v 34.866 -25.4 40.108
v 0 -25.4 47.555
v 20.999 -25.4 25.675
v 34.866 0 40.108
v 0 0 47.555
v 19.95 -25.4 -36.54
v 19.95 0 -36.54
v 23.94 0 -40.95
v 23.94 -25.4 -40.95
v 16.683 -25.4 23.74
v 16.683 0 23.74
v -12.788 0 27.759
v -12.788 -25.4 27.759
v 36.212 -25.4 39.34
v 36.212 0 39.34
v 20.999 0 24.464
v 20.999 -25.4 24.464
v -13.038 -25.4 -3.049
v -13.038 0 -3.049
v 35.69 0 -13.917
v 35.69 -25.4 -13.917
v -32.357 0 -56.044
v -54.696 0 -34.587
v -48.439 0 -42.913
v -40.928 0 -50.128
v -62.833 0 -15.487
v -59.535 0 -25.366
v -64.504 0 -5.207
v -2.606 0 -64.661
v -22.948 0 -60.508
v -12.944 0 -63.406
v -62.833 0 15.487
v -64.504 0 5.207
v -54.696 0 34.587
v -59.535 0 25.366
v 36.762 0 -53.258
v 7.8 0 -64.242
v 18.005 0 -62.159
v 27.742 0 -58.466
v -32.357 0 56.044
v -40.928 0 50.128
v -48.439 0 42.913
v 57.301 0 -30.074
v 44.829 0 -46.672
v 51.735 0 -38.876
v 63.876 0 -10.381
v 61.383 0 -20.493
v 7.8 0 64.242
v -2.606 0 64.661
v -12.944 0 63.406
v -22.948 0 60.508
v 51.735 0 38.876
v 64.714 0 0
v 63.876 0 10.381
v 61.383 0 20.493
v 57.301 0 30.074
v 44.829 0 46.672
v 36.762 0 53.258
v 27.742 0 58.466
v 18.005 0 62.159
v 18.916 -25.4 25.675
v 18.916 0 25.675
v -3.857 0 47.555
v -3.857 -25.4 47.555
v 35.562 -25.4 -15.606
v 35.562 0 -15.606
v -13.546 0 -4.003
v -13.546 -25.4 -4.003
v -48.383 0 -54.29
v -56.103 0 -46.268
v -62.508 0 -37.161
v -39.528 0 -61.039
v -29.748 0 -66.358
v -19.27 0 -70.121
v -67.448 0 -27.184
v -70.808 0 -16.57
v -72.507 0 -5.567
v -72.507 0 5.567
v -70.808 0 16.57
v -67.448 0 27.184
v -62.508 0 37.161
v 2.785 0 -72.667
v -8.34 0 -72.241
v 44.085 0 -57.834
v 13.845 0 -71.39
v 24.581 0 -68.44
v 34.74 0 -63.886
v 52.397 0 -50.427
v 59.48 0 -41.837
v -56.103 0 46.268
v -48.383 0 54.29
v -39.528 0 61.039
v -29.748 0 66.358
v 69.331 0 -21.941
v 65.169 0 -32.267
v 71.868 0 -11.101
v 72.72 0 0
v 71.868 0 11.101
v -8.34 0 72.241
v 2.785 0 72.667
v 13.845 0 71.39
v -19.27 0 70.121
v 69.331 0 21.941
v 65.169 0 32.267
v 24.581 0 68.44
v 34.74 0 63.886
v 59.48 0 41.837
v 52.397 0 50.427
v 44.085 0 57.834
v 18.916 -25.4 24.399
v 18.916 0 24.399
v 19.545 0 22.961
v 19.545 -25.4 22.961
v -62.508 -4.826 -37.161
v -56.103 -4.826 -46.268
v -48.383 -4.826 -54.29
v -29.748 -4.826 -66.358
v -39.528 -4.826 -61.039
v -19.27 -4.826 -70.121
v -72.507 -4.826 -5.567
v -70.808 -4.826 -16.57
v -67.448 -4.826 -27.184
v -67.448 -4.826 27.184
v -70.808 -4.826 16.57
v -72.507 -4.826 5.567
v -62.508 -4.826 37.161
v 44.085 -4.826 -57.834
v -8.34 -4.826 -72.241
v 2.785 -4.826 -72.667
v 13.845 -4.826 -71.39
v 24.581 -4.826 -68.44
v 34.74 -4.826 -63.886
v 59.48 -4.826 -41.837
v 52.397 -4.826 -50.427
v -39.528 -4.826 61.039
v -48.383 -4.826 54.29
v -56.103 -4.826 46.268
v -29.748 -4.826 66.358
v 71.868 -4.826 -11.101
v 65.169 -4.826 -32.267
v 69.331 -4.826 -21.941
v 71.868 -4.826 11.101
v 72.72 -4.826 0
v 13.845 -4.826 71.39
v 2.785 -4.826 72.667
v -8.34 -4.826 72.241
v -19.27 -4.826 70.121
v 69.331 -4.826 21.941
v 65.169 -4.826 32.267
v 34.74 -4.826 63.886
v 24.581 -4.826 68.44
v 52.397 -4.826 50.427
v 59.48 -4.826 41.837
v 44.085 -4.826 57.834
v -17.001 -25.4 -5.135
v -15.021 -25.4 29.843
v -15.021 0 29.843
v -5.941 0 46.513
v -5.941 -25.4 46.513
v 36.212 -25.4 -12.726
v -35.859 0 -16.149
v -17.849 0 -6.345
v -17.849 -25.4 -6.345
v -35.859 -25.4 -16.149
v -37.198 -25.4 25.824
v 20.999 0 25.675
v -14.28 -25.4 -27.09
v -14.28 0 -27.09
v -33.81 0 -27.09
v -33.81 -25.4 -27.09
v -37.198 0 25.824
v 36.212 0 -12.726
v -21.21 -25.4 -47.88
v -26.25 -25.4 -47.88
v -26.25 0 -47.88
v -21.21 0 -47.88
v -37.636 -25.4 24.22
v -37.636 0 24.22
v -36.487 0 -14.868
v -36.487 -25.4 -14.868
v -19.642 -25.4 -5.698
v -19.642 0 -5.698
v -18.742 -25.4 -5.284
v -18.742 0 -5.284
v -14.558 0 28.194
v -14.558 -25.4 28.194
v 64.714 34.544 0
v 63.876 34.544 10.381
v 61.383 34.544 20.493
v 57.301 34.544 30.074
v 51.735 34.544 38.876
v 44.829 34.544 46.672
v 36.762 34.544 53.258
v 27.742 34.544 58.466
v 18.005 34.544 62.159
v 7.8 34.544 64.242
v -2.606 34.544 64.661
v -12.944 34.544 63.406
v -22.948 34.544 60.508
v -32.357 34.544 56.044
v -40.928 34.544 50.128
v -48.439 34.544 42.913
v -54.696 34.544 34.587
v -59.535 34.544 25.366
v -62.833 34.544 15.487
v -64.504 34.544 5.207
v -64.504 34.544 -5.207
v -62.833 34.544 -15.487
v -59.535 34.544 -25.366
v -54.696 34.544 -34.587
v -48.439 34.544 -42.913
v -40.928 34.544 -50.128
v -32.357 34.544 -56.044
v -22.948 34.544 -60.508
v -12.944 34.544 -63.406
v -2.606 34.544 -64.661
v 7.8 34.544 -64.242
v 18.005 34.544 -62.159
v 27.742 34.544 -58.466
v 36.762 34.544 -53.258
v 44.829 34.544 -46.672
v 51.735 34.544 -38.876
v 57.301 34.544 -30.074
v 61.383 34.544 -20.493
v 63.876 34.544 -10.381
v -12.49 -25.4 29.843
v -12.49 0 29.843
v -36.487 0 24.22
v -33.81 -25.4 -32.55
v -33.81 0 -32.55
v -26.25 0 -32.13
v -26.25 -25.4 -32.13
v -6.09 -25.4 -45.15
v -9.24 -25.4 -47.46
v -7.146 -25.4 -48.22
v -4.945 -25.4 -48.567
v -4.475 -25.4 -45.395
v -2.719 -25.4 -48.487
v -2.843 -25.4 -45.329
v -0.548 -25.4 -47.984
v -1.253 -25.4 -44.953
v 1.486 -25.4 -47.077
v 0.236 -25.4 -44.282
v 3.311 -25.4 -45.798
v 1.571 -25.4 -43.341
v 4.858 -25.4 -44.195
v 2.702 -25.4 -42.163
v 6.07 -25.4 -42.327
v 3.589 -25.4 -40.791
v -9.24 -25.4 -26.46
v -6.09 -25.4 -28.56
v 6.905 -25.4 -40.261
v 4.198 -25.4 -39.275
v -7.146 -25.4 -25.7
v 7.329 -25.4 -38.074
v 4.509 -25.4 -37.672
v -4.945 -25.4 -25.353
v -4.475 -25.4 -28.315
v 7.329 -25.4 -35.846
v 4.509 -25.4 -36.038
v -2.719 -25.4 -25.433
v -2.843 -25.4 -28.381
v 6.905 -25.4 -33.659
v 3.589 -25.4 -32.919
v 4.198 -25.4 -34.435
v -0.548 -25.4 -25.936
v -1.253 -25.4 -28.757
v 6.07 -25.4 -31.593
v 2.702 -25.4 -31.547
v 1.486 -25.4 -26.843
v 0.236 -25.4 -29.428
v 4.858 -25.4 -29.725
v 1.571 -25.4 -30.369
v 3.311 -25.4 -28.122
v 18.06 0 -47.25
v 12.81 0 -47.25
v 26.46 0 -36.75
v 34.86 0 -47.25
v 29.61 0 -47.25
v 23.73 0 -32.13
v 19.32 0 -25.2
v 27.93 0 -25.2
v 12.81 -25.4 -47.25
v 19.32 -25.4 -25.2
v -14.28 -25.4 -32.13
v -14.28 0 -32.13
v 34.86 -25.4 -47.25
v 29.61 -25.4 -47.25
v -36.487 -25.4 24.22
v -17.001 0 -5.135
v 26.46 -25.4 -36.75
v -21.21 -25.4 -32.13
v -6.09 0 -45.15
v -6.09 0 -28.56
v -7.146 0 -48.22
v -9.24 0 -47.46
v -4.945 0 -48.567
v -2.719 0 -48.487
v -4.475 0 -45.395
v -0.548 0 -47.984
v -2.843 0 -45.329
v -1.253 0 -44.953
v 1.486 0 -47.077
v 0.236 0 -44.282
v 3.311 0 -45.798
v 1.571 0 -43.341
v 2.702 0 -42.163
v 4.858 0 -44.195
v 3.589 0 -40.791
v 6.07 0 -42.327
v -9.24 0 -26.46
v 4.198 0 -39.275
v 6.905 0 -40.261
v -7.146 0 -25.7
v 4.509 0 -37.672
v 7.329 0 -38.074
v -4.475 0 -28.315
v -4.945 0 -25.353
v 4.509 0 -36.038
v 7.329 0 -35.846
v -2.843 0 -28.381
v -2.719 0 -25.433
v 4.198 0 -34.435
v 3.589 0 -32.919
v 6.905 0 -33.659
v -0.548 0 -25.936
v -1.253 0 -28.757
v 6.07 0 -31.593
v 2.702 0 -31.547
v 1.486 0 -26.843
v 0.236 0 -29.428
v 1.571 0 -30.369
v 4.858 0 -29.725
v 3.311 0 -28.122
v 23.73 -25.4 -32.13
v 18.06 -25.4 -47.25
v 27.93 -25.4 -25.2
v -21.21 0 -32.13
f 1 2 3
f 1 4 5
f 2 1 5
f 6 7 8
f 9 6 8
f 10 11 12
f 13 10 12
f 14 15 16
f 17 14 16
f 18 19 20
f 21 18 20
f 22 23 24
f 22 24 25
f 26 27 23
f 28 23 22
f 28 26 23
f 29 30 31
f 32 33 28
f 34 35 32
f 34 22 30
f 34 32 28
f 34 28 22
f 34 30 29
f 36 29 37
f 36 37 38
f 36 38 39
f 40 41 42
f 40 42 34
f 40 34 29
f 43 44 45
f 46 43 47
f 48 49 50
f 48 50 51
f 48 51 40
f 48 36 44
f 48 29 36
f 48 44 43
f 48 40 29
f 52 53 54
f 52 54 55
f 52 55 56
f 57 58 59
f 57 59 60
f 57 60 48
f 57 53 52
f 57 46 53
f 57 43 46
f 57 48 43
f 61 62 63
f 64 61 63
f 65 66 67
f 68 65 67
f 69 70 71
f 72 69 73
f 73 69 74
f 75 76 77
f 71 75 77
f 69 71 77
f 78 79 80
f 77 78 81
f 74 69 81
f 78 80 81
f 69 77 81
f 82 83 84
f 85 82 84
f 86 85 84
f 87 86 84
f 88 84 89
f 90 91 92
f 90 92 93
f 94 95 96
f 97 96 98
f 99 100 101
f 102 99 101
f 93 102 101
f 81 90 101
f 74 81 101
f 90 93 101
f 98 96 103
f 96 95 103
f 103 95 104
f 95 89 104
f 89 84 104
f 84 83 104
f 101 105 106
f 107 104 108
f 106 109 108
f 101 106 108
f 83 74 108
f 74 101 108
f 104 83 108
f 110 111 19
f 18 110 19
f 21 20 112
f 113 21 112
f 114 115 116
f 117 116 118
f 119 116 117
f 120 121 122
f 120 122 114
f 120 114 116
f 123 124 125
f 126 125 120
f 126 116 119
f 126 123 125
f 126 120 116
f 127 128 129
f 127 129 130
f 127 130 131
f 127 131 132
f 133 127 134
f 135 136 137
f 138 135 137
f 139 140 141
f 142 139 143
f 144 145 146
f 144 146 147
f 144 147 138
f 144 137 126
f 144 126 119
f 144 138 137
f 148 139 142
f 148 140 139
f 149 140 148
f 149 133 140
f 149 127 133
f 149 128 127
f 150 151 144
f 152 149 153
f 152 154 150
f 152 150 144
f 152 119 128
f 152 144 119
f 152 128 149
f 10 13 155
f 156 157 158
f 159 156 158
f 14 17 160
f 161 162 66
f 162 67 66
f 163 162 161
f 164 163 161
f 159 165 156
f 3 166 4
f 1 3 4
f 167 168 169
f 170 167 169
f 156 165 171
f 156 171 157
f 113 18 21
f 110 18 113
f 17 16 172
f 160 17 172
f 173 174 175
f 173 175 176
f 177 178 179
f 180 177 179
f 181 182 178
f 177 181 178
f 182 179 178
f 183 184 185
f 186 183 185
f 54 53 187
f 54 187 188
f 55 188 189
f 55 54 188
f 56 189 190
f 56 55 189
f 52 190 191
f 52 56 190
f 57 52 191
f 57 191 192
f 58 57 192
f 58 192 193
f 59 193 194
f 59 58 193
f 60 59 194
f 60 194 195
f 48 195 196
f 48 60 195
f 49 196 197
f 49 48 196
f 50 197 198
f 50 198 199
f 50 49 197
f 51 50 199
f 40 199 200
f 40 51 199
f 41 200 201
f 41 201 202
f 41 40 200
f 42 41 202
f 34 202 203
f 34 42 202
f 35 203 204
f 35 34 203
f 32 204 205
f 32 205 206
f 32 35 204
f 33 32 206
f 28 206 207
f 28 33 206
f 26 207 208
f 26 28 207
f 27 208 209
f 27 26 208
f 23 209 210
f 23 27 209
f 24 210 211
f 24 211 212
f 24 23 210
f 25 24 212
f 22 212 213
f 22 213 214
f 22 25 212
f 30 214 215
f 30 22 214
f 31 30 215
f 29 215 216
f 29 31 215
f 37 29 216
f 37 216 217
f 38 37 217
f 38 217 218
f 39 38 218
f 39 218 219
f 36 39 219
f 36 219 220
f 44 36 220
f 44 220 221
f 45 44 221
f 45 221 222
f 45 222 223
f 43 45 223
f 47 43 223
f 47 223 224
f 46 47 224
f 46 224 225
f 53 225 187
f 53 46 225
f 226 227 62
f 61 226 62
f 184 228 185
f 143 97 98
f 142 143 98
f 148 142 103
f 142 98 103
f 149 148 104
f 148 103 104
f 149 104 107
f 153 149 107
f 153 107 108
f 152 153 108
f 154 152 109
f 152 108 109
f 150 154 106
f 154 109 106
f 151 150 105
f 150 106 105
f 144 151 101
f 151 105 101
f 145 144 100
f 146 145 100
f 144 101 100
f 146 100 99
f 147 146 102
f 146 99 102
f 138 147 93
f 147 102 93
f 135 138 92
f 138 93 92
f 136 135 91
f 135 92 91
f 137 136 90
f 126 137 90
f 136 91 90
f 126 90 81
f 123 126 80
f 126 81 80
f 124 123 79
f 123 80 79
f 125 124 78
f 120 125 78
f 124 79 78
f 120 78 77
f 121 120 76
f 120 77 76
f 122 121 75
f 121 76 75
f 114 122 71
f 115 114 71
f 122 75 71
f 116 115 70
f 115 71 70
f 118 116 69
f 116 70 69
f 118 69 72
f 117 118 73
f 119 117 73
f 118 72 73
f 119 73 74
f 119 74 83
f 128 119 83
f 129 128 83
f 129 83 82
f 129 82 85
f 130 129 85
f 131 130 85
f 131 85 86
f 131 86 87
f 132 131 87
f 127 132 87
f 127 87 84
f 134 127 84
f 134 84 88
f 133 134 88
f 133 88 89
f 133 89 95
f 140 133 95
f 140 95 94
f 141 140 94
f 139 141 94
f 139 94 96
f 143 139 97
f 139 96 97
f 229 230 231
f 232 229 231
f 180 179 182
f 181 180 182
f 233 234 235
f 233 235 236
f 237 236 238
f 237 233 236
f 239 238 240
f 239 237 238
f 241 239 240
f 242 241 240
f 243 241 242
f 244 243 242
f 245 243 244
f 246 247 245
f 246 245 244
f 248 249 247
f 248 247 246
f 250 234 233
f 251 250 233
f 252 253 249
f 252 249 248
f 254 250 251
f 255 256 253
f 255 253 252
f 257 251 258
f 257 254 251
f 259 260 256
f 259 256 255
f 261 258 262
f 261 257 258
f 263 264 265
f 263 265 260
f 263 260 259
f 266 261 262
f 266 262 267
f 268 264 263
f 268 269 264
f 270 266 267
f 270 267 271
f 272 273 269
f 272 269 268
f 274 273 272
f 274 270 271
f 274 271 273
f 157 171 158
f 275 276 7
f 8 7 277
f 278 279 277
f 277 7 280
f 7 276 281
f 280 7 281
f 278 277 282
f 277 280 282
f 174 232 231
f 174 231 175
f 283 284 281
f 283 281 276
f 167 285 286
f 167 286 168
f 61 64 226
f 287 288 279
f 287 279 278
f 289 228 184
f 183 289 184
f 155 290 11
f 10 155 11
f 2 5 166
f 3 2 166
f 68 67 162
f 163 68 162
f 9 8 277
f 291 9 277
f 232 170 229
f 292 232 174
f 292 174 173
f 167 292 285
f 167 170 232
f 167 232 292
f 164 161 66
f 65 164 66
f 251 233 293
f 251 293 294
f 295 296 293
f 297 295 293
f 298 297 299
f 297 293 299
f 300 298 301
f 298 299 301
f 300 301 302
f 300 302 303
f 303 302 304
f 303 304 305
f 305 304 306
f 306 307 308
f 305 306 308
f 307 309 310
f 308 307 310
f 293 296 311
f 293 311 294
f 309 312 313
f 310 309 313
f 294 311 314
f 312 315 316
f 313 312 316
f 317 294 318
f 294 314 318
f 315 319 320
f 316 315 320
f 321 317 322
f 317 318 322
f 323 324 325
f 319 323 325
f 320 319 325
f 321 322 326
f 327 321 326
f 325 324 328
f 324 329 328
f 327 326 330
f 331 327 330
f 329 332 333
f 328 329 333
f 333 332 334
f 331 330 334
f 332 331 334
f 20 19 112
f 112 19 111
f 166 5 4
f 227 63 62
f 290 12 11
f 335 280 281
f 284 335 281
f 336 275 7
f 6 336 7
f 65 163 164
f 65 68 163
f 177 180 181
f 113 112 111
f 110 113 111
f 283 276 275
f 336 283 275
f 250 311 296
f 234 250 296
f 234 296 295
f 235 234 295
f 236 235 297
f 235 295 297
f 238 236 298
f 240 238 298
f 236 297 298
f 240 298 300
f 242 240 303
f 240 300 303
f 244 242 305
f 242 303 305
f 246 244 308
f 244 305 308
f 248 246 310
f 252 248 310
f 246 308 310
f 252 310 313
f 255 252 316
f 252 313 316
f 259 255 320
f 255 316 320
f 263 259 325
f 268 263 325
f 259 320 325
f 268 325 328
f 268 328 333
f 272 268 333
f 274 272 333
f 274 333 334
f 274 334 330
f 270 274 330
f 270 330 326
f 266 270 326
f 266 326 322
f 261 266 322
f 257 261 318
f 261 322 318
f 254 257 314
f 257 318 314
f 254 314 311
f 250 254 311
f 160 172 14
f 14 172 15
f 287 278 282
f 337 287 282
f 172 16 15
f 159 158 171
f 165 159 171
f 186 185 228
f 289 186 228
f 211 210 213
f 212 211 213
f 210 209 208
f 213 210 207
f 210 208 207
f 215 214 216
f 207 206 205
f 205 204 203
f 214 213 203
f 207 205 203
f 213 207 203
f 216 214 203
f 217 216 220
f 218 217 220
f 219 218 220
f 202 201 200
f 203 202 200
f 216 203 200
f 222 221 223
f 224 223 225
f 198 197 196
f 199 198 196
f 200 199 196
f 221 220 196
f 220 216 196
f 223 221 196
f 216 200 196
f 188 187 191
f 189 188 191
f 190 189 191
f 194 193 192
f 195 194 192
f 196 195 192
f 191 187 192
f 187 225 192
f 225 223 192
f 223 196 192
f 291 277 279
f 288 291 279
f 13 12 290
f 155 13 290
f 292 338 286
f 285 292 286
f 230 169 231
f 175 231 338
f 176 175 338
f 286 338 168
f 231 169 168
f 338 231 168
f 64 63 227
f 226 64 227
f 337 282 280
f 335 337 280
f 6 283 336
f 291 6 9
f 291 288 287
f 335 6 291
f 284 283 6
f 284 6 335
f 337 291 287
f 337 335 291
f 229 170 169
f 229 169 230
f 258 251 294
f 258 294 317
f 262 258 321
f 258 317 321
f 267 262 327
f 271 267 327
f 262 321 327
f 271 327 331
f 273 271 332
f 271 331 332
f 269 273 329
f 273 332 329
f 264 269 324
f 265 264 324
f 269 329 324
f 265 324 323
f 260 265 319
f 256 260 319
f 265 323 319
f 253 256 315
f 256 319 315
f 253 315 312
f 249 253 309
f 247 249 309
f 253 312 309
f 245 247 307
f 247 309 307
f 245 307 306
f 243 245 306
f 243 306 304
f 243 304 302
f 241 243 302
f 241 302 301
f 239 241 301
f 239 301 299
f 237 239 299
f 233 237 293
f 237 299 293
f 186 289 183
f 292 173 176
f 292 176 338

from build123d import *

# Parameters (mm, degrees)
F1_DEPTH = 25.4
F2_R     = 64.713849
F3_DEPTH = 34.544
F4_R     = 72.72038
F5_DEPTH = 4.826


with BuildPart() as f1:
    # F0 (on Front) → F1 (new body)
    with BuildSketch(Plane.XZ):
        Polygon((-33.810001, -32.55), (-26.250001, -32.129999), (-26.250001, -47.880001), (-21.21, -47.880001), (-21.21, -32.129999), (-14.28, -32.129999), (-14.28, -27.09), (-33.810001, -27.09), align=None)
        with BuildLine():
            ThreePointArc((-9.24, -47.459997), (7.38291, -36.959998), (-9.24, -26.459999))
            Line((-9.24, -26.459999), (-9.24, -47.459997))
        make_face()
        with BuildLine():
            Line((-6.09, -45.150001), (-6.09, -28.56))
            ThreePointArc((-6.09, -28.56), (4.548028, -36.855), (-6.09, -45.150001))
        make_face(mode=Mode.SUBTRACT)
        Polygon((23.730002, -32.129999), (19.320002, -25.2), (12.81, -47.250003), (18.060001, -47.250003), (19.950001, -36.539998), (23.940001, -40.95), (26.460001, -36.75), (29.609999, -47.250003), (34.860004, -47.250003), (27.929999, -25.2), align=None)
        Polygon((-5.941163, 46.513464), (-37.198212, 25.824275), (-15.02059, 29.843038), align=None)
        Polygon((-3.85736, 47.555361), (-12.490258, 29.843038), (18.915633, 25.675431), align=None)
        Polygon((34.865764, 40.107735), (0, 47.555361), (20.999435, 25.675431), align=None)
        Polygon((36.211781, -12.726083), (36.211781, 39.339835), (20.999435, 24.463724), align=None)
        Polygon((-14.557891, 28.193708), (-36.486941, 24.219988), (-18.741667, -5.283929), align=None)
        Polygon((-17.001314, -5.135086), (16.682984, 23.74047), (-12.787945, 27.759233), align=None)
        Polygon((-17.848609, -6.345073), (-35.85862, -16.149474), (35.561599, -15.605713), (-13.546449, -4.003036), align=None)
        Polygon((-19.642144, -5.698055), (-37.636496, 24.219988), (-36.486941, -14.868131), align=None)
        Polygon((18.915633, 24.399498), (-13.038057, -3.048536), (35.689779, -13.916828), (19.545413, 22.960923), align=None)
    extrude(amount=F1_DEPTH)


with BuildPart() as f3:
    # F2 (on Front) → F3 (new body)
    with BuildSketch(Plane.XZ):
        Circle(F2_R)
    extrude(amount=-F3_DEPTH)


with BuildPart() as f5:
    # F4 (on Front) → F5 (new body)
    with BuildSketch(Plane.XZ):
        Circle(F4_R)
    extrude(amount=F5_DEPTH)


solid = Compound([f1.part, f3.part, f5.part])
